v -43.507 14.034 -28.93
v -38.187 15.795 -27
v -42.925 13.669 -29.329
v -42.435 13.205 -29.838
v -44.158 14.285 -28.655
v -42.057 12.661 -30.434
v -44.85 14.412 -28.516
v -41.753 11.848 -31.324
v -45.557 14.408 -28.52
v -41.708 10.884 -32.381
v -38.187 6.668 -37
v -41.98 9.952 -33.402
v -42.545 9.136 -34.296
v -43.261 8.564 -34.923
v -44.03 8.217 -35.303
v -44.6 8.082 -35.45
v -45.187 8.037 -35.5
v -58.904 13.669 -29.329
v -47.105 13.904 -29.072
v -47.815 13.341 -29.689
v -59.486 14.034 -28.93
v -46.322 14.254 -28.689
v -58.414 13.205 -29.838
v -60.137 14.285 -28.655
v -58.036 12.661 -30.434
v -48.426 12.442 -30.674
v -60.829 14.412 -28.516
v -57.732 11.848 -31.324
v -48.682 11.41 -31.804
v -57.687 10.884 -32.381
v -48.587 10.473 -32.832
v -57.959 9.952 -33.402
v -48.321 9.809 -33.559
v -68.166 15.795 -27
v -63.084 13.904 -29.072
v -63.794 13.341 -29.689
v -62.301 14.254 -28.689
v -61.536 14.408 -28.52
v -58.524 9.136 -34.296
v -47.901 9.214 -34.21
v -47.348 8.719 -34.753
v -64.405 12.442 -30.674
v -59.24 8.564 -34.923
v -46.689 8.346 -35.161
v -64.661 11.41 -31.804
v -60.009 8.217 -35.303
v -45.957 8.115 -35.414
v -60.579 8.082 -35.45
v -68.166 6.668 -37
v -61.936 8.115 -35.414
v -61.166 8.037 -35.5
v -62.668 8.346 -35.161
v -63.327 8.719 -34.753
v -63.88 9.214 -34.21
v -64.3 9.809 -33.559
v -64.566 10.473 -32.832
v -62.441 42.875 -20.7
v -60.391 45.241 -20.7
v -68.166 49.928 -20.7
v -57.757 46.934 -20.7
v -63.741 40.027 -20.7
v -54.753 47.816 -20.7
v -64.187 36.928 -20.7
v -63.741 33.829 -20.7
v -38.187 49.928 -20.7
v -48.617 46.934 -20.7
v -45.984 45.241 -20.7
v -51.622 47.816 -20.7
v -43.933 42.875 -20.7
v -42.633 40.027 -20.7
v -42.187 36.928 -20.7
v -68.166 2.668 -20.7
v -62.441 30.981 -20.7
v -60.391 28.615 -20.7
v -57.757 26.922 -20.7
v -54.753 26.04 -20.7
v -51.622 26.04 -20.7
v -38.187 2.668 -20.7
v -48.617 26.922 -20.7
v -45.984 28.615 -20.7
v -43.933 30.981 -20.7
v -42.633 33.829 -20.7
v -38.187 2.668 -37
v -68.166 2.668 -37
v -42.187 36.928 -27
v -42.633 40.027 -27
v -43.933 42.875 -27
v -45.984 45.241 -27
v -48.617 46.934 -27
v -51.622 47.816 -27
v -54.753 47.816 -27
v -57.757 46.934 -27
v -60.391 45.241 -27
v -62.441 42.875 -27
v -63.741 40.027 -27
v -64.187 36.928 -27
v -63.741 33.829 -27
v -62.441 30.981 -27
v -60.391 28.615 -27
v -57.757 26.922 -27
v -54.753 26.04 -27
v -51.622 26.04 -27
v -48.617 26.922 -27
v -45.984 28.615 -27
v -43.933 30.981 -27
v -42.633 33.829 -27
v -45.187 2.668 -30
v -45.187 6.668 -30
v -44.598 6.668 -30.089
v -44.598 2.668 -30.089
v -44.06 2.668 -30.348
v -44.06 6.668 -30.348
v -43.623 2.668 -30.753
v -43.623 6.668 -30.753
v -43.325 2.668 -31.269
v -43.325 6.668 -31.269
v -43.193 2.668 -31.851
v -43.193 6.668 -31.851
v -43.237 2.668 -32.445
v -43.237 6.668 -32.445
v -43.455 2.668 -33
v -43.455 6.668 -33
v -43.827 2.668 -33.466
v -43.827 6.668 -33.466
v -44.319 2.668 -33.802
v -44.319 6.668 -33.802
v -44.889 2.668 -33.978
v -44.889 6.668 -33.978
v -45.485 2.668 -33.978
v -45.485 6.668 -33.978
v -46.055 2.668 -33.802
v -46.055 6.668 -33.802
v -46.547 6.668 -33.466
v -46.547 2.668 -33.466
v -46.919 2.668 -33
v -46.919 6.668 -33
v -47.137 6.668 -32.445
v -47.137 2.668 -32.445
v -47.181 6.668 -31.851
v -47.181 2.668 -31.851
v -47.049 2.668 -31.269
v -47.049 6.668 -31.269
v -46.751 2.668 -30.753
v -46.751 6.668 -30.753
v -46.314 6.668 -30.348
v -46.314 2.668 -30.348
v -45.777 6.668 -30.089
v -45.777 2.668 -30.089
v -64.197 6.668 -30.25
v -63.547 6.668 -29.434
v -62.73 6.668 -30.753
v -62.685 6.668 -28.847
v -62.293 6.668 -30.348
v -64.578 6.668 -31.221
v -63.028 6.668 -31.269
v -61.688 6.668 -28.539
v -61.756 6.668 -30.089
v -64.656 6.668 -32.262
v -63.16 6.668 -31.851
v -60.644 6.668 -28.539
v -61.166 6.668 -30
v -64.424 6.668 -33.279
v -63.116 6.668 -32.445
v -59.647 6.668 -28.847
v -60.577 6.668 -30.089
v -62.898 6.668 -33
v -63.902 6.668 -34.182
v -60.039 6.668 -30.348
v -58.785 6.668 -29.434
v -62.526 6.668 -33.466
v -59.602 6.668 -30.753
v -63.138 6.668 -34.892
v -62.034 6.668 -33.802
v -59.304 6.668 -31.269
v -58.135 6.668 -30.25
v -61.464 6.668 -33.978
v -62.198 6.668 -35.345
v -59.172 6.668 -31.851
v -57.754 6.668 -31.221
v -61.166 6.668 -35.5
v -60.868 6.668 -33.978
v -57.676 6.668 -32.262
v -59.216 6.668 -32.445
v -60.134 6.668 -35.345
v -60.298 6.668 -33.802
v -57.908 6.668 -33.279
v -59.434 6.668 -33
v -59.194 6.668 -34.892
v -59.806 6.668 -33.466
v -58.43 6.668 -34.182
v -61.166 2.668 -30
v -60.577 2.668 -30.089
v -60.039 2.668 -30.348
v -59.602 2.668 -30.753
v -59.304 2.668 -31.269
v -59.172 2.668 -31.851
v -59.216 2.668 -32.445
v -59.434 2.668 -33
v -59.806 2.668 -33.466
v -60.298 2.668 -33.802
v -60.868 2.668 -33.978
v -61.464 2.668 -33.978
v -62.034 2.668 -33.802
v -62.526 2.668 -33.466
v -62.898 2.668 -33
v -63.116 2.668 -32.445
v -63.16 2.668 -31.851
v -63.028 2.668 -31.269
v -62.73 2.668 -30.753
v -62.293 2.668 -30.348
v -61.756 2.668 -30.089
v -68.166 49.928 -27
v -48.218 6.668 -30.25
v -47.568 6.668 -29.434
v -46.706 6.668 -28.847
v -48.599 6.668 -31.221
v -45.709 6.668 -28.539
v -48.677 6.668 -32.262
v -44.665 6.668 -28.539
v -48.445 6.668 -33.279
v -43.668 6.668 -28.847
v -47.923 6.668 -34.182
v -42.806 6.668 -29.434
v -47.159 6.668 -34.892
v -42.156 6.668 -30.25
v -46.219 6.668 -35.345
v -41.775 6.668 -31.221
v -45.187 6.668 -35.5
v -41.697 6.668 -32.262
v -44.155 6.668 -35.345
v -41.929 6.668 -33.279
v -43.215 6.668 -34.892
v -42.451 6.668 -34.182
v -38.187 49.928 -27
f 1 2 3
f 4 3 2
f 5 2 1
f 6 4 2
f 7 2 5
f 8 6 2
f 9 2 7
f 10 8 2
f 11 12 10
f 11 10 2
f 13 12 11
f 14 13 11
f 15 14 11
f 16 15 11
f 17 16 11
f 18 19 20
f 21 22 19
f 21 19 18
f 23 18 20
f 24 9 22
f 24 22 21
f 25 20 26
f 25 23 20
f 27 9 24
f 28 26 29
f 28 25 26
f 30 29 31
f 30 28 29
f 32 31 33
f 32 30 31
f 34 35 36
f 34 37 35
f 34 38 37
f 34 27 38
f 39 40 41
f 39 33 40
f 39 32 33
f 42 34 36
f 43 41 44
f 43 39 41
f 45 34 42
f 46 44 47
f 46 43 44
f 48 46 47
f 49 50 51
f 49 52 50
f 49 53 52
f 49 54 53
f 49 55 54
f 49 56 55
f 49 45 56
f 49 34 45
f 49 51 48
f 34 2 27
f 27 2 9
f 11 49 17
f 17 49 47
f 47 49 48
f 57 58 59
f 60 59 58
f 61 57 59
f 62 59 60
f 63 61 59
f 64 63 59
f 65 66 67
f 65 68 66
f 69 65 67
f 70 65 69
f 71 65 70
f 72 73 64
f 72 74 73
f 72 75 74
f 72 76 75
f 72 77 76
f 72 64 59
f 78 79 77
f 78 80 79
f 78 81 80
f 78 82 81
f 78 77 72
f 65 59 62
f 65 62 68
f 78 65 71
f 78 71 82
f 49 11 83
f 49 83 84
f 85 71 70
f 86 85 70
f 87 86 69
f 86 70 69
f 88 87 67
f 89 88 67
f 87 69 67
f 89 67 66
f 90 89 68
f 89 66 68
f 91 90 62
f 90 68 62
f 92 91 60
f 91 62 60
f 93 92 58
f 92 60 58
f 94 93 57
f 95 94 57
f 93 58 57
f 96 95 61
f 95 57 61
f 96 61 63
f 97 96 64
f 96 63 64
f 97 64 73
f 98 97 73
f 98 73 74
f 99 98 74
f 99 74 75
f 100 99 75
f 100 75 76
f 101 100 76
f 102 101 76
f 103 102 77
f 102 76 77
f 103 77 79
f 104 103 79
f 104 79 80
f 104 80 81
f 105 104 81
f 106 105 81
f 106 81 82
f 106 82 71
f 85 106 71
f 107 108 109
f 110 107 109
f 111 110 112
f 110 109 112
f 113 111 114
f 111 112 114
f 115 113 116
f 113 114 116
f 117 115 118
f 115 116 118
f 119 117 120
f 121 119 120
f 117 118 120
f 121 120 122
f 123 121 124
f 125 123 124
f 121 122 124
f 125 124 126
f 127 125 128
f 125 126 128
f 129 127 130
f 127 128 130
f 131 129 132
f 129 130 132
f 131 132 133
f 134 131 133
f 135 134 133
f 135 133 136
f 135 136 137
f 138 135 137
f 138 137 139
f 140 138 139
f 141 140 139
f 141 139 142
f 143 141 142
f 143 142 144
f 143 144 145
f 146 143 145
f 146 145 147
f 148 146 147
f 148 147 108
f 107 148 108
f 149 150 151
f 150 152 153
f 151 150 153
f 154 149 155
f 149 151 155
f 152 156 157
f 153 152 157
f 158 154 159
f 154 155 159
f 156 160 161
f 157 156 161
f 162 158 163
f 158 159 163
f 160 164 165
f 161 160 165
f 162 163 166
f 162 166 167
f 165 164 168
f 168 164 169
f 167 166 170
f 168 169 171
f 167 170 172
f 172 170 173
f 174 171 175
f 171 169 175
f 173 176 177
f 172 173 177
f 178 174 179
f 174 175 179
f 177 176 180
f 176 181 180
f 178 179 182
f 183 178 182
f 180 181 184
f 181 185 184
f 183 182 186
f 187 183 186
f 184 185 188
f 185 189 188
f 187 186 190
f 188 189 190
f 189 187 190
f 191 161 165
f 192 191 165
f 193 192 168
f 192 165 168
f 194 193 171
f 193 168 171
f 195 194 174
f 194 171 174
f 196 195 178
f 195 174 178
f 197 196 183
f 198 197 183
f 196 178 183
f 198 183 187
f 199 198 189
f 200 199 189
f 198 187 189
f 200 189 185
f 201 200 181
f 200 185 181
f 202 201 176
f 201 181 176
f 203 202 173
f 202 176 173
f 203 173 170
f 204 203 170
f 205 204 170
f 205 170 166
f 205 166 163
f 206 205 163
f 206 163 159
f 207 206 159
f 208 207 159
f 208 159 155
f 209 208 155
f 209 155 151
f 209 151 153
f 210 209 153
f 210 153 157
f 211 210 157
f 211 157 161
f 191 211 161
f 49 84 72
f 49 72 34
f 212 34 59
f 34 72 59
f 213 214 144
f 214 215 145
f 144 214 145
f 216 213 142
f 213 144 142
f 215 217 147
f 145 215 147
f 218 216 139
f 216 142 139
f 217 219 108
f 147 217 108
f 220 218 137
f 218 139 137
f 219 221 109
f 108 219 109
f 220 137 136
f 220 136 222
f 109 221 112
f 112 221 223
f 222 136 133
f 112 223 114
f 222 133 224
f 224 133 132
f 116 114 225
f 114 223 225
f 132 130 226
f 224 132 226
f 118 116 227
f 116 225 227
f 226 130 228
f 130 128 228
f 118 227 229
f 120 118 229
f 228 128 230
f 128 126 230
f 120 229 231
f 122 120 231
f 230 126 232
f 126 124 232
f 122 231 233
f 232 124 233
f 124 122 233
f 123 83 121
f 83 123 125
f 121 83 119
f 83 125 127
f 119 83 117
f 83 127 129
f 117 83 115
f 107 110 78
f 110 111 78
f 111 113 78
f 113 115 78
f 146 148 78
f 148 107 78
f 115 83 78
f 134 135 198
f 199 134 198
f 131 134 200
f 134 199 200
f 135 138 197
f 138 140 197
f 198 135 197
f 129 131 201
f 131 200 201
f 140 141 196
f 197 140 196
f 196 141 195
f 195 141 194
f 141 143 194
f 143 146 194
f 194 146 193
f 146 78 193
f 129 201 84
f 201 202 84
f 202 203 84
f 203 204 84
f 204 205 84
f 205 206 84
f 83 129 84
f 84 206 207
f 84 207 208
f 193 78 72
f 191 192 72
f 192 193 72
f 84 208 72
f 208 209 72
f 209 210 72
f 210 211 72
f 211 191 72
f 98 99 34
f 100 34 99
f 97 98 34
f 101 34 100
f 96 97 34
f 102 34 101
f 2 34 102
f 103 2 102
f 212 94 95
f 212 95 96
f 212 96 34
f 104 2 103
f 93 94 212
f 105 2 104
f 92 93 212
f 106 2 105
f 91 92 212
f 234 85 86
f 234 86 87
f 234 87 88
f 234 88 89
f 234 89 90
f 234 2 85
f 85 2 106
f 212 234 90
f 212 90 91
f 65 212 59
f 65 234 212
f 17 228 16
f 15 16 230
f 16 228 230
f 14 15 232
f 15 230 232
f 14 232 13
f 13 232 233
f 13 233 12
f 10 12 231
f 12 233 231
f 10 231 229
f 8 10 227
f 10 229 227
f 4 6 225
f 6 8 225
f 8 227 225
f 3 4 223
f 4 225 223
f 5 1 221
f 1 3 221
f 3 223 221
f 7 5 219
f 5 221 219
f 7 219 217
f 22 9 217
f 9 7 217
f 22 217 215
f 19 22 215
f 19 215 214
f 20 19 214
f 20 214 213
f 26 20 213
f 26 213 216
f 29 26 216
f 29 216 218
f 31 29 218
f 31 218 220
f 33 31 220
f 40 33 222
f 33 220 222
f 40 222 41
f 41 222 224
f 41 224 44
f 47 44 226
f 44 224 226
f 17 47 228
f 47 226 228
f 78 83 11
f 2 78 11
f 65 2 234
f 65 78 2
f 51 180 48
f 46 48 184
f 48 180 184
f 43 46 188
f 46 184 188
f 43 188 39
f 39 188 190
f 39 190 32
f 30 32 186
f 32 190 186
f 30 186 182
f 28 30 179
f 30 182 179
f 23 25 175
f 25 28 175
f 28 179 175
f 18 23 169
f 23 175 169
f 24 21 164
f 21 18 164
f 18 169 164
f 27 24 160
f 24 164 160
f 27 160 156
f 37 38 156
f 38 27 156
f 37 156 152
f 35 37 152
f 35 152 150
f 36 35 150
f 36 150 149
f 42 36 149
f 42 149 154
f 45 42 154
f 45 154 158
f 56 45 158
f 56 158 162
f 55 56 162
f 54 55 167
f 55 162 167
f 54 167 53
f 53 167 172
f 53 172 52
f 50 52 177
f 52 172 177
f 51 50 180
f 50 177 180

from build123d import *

# Parameters (mm, degrees)
SKETCH1_W            = 93
SKETCH1_H            = 100
BOSS_EXTRUDE2_DEPTH  = 10
SKETCH4_W            = 10.01
SKETCH4_H            = 15
BOSS_EXTRUDE4_DEPTH  = 24
SKETCH5_R            = 2
CUT_EXTRUDE1_DEPTH   = 50
SKETCH7_R            = 11
CUT_EXTRUDE3_DEPTH   = 50
SKETCH14_W           = 61.5
SKETCH14_H           = 42
CUT_EXTRUDE8_DEPTH   = 4
SKETCH19_R           = 11
CUT_EXTRUDE11_DEPTH  = 15
SKETCH20_R           = 2
CUT_EXTRUDE12_DEPTH  = 10
SKETCH21_W           = 40
SKETCH21_H           = 6
BOSS_EXTRUDE5_DEPTH  = 27
SKETCH22_W           = 40
SKETCH22_H           = 6.3
BOSS_EXTRUDE7_DEPTH  = 40
SKETCH23_R           = 8
CUT_EXTRUDE13_DEPTH  = 40
SKETCH24_W           = 118.277817783
SKETCH24_H           = 41.8
CUT_EXTRUDE14_DEPTH  = 40
SKETCH25_W           = 31.5
SKETCH25_H           = 23.2
CUT_EXTRUDE15_DEPTH  = 20
CUT_EXTRUDE18_DEPTH  = 3
SKETCH27_R           = 4.1
SKETCH27_R_2         = 4
CUT_EXTRUDE29_DEPTH  = 3
SKETCH28_W           = 29.5
SKETCH28_H           = 58.2
CUT_EXTRUDE30_DEPTH  = 23
SKETCH29_W           = 32
SKETCH29_H           = 4
CUT_EXTRUDE31_DEPTH  = 23
SKETCH31_W           = 32
SKETCH31_H           = 6
BOSS_EXTRUDE9_DEPTH  = 6.6
SKETCH32_W           = 32
SKETCH32_H           = 6
BOSS_EXTRUDE10_DEPTH = 10
SKETCH33_R           = 2
CUT_EXTRUDE32_DEPTH  = 10
BOSS_EXTRUDE11_START = -32
BOSS_EXTRUDE11_DEPTH = 32
SKETCH35_R           = 3.5
CUT_EXTRUDE33_DEPTH  = 10
SKETCH36_W           = 40
SKETCH36_H           = 6.3
BOSS_EXTRUDE12_DEPTH = 18.8
SKETCH37_W           = 40
SKETCH37_H           = 6
BOSS_EXTRUDE13_DEPTH = 16
SKETCH38_R           = 2
CUT_EXTRUDE34_DEPTH  = 16
BOSS_EXTRUDE14_DEPTH = 40
SKETCH40_R           = 3.5
CUT_EXTRUDE35_DEPTH  = 16
SKETCH41_W           = 16
SKETCH41_H           = 64.8
CUT_EXTRUDE36_DEPTH  = 76
SKETCH42_W           = 20.7
SKETCH42_H           = 6
CUT_EXTRUDE37_DEPTH  = 76
SKETCH43_W           = 10.32098901
SKETCH43_H           = 73.075116481
CUT_EXTRUDE38_DEPTH  = 30
SKETCH44_W           = 2
SKETCH44_H           = 70.783229749
CUT_EXTRUDE39_DEPTH  = 30
SKETCH45_W           = 27.67901099
SKETCH45_H           = 15
CUT_EXTRUDE40_DEPTH  = 30
SKETCH46_W           = 27.67901099
SKETCH46_H           = 2.54
CUT_EXTRUDE41_DEPTH  = 110
SKETCH47_R           = 11
CUT_EXTRUDE42_DEPTH  = 20
BOSS_EXTRUDE16_DEPTH = 2.3
CUT_EXTRUDE43_DEPTH  = 50
SKETCH51_W           = 29.97901099
SKETCH51_H           = 4
BOSS_EXTRUDE17_DEPTH = 10
SKETCH52_R           = 2
CUT_EXTRUDE44_DEPTH  = 10
BOSS_EXTRUDE18_DEPTH = 29.979011
SKETCH54_R           = 3.5
CUT_EXTRUDE45_DEPTH  = 10


with BuildPart() as part:
    # Sketch1 → Boss-Extrude2 (new body)
    with BuildSketch(Plane.XY):
        with Locations((-29.68705036, 14.928057554)):
            Rectangle(SKETCH1_W, SKETCH1_H)
    extrude(amount=BOSS_EXTRUDE2_DEPTH)

    # Sketch4 → Boss-Extrude4 (add)
    with BuildSketch(Plane(origin=(16.81294964, 0, 0), x_dir=(0, 0, -1), z_dir=(1, 0, 0))):
        with Locations((-4.995, -12.571942446)):
            Rectangle(SKETCH4_W, SKETCH4_H)
    extrude(amount=BOSS_EXTRUDE4_DEPTH)

    # Sketch5 → Cut-Extrude1 (cut)
    with BuildSketch(Plane(origin=(0, -5.071942446, 0), x_dir=(1, 0, 0), z_dir=(0, 1, 0))):
        with Locations(Location((26.81294964, -5, 0), (0, 0, 180))):
            Circle(SKETCH5_R)
    extrude(amount=-CUT_EXTRUDE1_DEPTH, mode=Mode.SUBTRACT)

    # Sketch7 → Cut-Extrude3 (cut)
    with BuildSketch(Plane(origin=(0, 0, 0), x_dir=(-1, 0, 0), z_dir=(0, 0, -1))):
        with Locations((24.18705036, 36.928057554)):
            Circle(SKETCH7_R)
    extrude(amount=-CUT_EXTRUDE3_DEPTH, mode=Mode.SUBTRACT)

    # Sketch14 → Cut-Extrude8 (cut)
    with BuildSketch(Plane.XY.offset(10)):
        with Locations((-13.93705036, 36.789132279)):
            Rectangle(SKETCH14_W, SKETCH14_H)
    extrude(amount=-CUT_EXTRUDE8_DEPTH, mode=Mode.SUBTRACT)

    # Sketch19 → Cut-Extrude11 (cut)
    with BuildSketch(Plane(origin=(0, 0, 0), x_dir=(-1, 0, 0), z_dir=(0, 0, -1))):
        with Locations((53.18705036, 36.928057554)):
            Circle(SKETCH19_R)
    extrude(amount=-CUT_EXTRUDE11_DEPTH, mode=Mode.SUBTRACT)

    # Sketch20 → Cut-Extrude12 (cut)
    with BuildSketch(Plane.XY.offset(6)):
        with Locations((-34.68705036, 50.928057554)):
            Circle(SKETCH20_R)
        with Locations((5.31294964, 50.928057554)):
            Circle(SKETCH20_R)
        with Locations((-34.68705036, 22.928057554)):
            Circle(SKETCH20_R)
        with Locations((5.31294964, 22.928057554)):
            Circle(SKETCH20_R)
    extrude(amount=-CUT_EXTRUDE12_DEPTH, mode=Mode.SUBTRACT)

    # Sketch21 → Boss-Extrude5 (add)
    with BuildSketch(Plane(origin=(0, 0, 0), x_dir=(-1, 0, 0), z_dir=(0, 0, -1))):
        with Locations((56.18705036, 61.928057554)):
            Rectangle(SKETCH21_W, SKETCH21_H)
    extrude(amount=BOSS_EXTRUDE5_DEPTH)

    # Sketch22 → Boss-Extrude7 (add)
    with BuildSketch(Plane.XZ.offset(-58.928057554)):
        with Locations((-56.18705036, -23.85)):
            Rectangle(SKETCH22_W, SKETCH22_H)
    extrude(amount=BOSS_EXTRUDE7_DEPTH)

    # Sketch23 → Cut-Extrude13 (cut)
    with BuildSketch(Plane.XY.offset(10)):
        with Locations((-53.18705036, 36.928057554)):
            Circle(SKETCH23_R)
    extrude(amount=-CUT_EXTRUDE13_DEPTH, mode=Mode.SUBTRACT)

    # Sketch24 → Cut-Extrude14 (cut)
    with BuildSketch(Plane.XY.offset(10)):
        with Locations((-17.048141468, -14.171942446)):
            Rectangle(SKETCH24_W, SKETCH24_H)
    extrude(amount=-CUT_EXTRUDE14_DEPTH, mode=Mode.SUBTRACT)

    # Sketch25 → Cut-Extrude15 (cut)
    with BuildSketch(Plane.XY.offset(10)):
        with Locations((-60.43705036, 18.328057554)):
            Rectangle(SKETCH25_W, SKETCH25_H)
    extrude(amount=-CUT_EXTRUDE15_DEPTH, mode=Mode.SUBTRACT)

    # Sketch26 → Cut-Extrude18 (cut)
    with BuildSketch(Plane.XY.offset(6)):
        with BuildLine():
            Line((14.30212304, 57.789132279), (6.863398886, 57.789132279))
            Line((6.863398886, 57.789132279), (6.863398886, 54.615347499))
            ThreePointArc((6.863398886, 54.615347499), (8.24773413, 53.645968516), (9.108195728, 52.191428892))
            Line((9.108195728, 52.191428892), (14.30212304, 52.191428892))
            Line((14.30212304, 52.191428892), (14.30212304, 57.789132279))
        make_face()
        with BuildLine():
            Line((6.863398886, 19.240767609), (6.863398886, 15.789132279))
            Line((6.863398886, 15.789132279), (14.30212304, 15.789132279))
            Line((14.30212304, 15.789132279), (14.30212304, 20.928057554))
            Line((14.30212304, 20.928057554), (8.777051255, 20.928057554))
            ThreePointArc((8.777051255, 20.928057554), (7.95835451, 19.927752057), (6.863398886, 19.240767609))
        make_face()
        with BuildLine():
            Line((-36.237499605, 57.789132279), (-44.68705036, 57.789132279))
            Line((-44.68705036, 57.789132279), (-44.68705036, 52.191428892))
            Line((-44.68705036, 52.191428892), (-38.482296447, 52.191428892))
            ThreePointArc((-38.482296447, 52.191428892), (-37.621834849, 53.645968516), (-36.237499605, 54.615347499))
            Line((-36.237499605, 54.615347499), (-36.237499605, 57.789132279))
        make_face()
        with BuildLine():
            Line((-44.68705036, 21.664686216), (-44.68705036, 15.789132279))
            Line((-44.68705036, 15.789132279), (-36.237499605, 15.789132279))
            Line((-36.237499605, 15.789132279), (-36.237499605, 19.240767609))
            ThreePointArc((-36.237499605, 19.240767609), (-37.621834849, 20.210146592), (-38.482296447, 21.664686216))
            Line((-38.482296447, 21.664686216), (-44.68705036, 21.664686216))
        make_face()
    extrude(amount=-CUT_EXTRUDE18_DEPTH, mode=Mode.SUBTRACT)

    # Sketch27 → Cut-Extrude29 (cut)
    with BuildSketch(Plane.XY.offset(6)):
        with Locations((5.31294964, 50.928057554)):
            Circle(SKETCH27_R)
        with Locations((5.31294964, 22.928057554)):
            Circle(SKETCH27_R_2)
        with Locations((-34.68705036, 50.928057554)):
            Circle(SKETCH27_R)
        with Locations((-34.68705036, 22.928057554)):
            Circle(SKETCH27_R)
    extrude(amount=-CUT_EXTRUDE29_DEPTH, mode=Mode.SUBTRACT)

    # Sketch28 → Cut-Extrude30 (cut)
    with BuildSketch(Plane(origin=(0, 0, 0), x_dir=(-1, 0, 0), z_dir=(0, 0, -1))):
        with Locations((-2.06294964, 35.828057554)):
            Rectangle(SKETCH28_W, SKETCH28_H)
    extrude(amount=-CUT_EXTRUDE30_DEPTH, mode=Mode.SUBTRACT)

    # Sketch29 → Cut-Extrude31 (cut)
    with BuildSketch(Plane(origin=(0, 15.789132279, 0), x_dir=(1, 0, 0), z_dir=(0, 1, 0))):
        with Locations((-28.68705036, -8)):
            Rectangle(SKETCH29_W, SKETCH29_H)
    extrude(amount=-CUT_EXTRUDE31_DEPTH, mode=Mode.SUBTRACT)

    # Sketch31 → Boss-Extrude9 (add)
    with BuildSketch(Plane.XZ.offset(-6.728057554)):
        with Locations((-28.68705036, 3)):
            Rectangle(SKETCH31_W, SKETCH31_H)
    extrude(amount=BOSS_EXTRUDE9_DEPTH)

    # Sketch32 → Boss-Extrude10 (add)
    with BuildSketch(Plane.XY.offset(6)):
        with Locations((-28.68705036, 3.128057554)):
            Rectangle(SKETCH32_W, SKETCH32_H)
    extrude(amount=BOSS_EXTRUDE10_DEPTH)

    # Sketch33 → Cut-Extrude32 (cut)
    with BuildSketch(Plane(origin=(0, 6.128057554, 0), x_dir=(1, 0, 0), z_dir=(0, 1, 0))):
        with Locations(Location((-37.68705036, -11, 0), (0, 0, 270))):
            Circle(SKETCH33_R)
        with Locations(Location((-19.68705036, -11, 0), (0, 0, 270))):
            Circle(SKETCH33_R)
    extrude(amount=-CUT_EXTRUDE32_DEPTH, mode=Mode.SUBTRACT)

    # Sketch34 → Boss-Extrude11 (add)
    with BuildSketch(Plane(origin=(-12.68705036, 0, 0), x_dir=(0, 0, -1), z_dir=(1, 0, 0)).offset(BOSS_EXTRUDE11_START)):
        Polygon((-16, 6.128057554), (-6, 6.128057554), (-6, 14.058360342), align=None)
    extrude(amount=BOSS_EXTRUDE11_DEPTH)

    # Sketch35 → Cut-Extrude33 (cut)
    with BuildSketch(Plane.XZ.offset(-6.128057554)):
        with Locations((-19.68705036, 11)):
            Circle(SKETCH35_R)
        with Locations((-37.68705036, 11)):
            Circle(SKETCH35_R)
    extrude(amount=-CUT_EXTRUDE33_DEPTH, mode=Mode.SUBTRACT)

    # Sketch36 → Boss-Extrude12 (add)
    with BuildSketch(Plane.XZ.offset(-18.928057554)):
        with Locations((-56.18705036, -23.85)):
            Rectangle(SKETCH36_W, SKETCH36_H)
    extrude(amount=BOSS_EXTRUDE12_DEPTH)

    # Sketch37 → Boss-Extrude13 (add)
    with BuildSketch(Plane.XY.offset(-20.7)):
        with Locations((-56.18705036, 3.128057554)):
            Rectangle(SKETCH37_W, SKETCH37_H)
    extrude(amount=BOSS_EXTRUDE13_DEPTH)

    # Sketch38 → Cut-Extrude34 (cut)
    with BuildSketch(Plane(origin=(0, 6.128057554, 0), x_dir=(1, 0, 0), z_dir=(0, 1, 0))):
        with Locations(Location((-58.18705036, 10.7, 0), (0, 0, 180))):
            Circle(SKETCH38_R)
        with Locations(Location((-45.18705036, 10.7, 0), (0, 0, 180))):
            Circle(SKETCH38_R)
    extrude(amount=-CUT_EXTRUDE34_DEPTH, mode=Mode.SUBTRACT)

    # Sketch39 → Boss-Extrude14 (add)
    with BuildSketch(Plane(origin=(-36.18705036, 0, 0), x_dir=(0, 0, -1), z_dir=(1, 0, 0))):
        Polygon((4.7, 6.128057554), (20.7, 18.878141719), (20.7, 6.128057554), align=None)
    extrude(amount=-BOSS_EXTRUDE14_DEPTH)

    # Sketch40 → Cut-Extrude35 (cut)
    with BuildSketch(Plane.XZ.offset(-6.128057554)):
        with Locations(Location((-45.18705036, -10.7, 0), (0, 0, 270))):
            Circle(SKETCH40_R)
        with Locations(Location((-58.18705036, -10.7, 0), (0, 0, 270))):
            Circle(SKETCH40_R)
    extrude(amount=-CUT_EXTRUDE35_DEPTH, mode=Mode.SUBTRACT)

    # Sketch41 → Cut-Extrude36 (cut)
    with BuildSketch(Plane(origin=(-12.68705036, 0, 0), x_dir=(0, 0, -1), z_dir=(1, 0, 0))):
        with Locations((-8, 32.528057554)):
            Rectangle(SKETCH41_W, SKETCH41_H)
    extrude(amount=-CUT_EXTRUDE36_DEPTH, mode=Mode.SUBTRACT)

    # Sketch42 → Cut-Extrude37 (cut)
    with BuildSketch(Plane(origin=(-36.18705036, 0, 0), x_dir=(0, 0, -1), z_dir=(1, 0, 0))):
        with Locations((10.35, 61.928057554)):
            Rectangle(SKETCH42_W, SKETCH42_H)
    extrude(amount=-CUT_EXTRUDE37_DEPTH, mode=Mode.SUBTRACT)

    # Sketch43 → Cut-Extrude38 (cut)
    with BuildSketch(Plane.XY.offset(-4.7)):
        with Locations((-71.026555855, 36.665615794)):
            Rectangle(SKETCH43_W, SKETCH43_H)
    extrude(amount=-CUT_EXTRUDE38_DEPTH, mode=Mode.SUBTRACT)

    # Sketch44 → Cut-Extrude39 (cut)
    with BuildSketch(Plane.XY.offset(-4.7)):
        with Locations((-37.18705036, 35.519672429)):
            Rectangle(SKETCH44_W, SKETCH44_H)
    extrude(amount=-CUT_EXTRUDE39_DEPTH, mode=Mode.SUBTRACT)

    # Sketch45 → Cut-Extrude40 (cut)
    with BuildSketch(Plane.XY.offset(-20.7)):
        with Locations((-52.026555855, 57.428057554)):
            Rectangle(SKETCH45_W, SKETCH45_H)
    extrude(amount=-CUT_EXTRUDE40_DEPTH, mode=Mode.SUBTRACT)

    # Sketch46 → Cut-Extrude41 (cut)
    with BuildSketch(Plane.XY.offset(-4.7)):
        with Locations((-52.026555855, 1.398057554)):
            Rectangle(SKETCH46_W, SKETCH46_H)
    extrude(amount=-CUT_EXTRUDE41_DEPTH, mode=Mode.SUBTRACT)

    # Sketch47 → Cut-Extrude42 (cut)
    with BuildSketch(Plane.XY.offset(-20.7)):
        with Locations((-53.18705036, 36.928057554)):
            Circle(SKETCH47_R)
    extrude(amount=-CUT_EXTRUDE42_DEPTH, mode=Mode.SUBTRACT)

    # Sketch48 → Boss-Extrude16 (add)
    with BuildSketch(Plane.ZY.offset(65.86606135)):
        Polygon((-27, 49.928057554), (-20.7, 49.928057554), (-20.7, 18.878141719), (-4.7, 6.128057554), (-4.7, 2.668057554), (-27, 2.668057554), align=None)
    extrude(amount=BOSS_EXTRUDE16_DEPTH)

    # Sketch49 → Cut-Extrude43 (cut)
    with BuildSketch(Plane.ZY.offset(68.16606135)):
        Polygon((-4.7, 2.668057554), (-4.7, 6.128057554), (-20.7, 18.878141719), (-20.7, 2.668057554), align=None)
    extrude(amount=-CUT_EXTRUDE43_DEPTH, mode=Mode.SUBTRACT)

    # Sketch51 → Boss-Extrude17 (add)
    with BuildSketch(Plane(origin=(0, 0, -27), x_dir=(-1, 0, 0), z_dir=(0, 0, -1))):
        with Locations((53.176555855, 4.668057554)):
            Rectangle(SKETCH51_W, SKETCH51_H)
    extrude(amount=BOSS_EXTRUDE17_DEPTH)

    # Sketch52 → Cut-Extrude44 (cut)
    with BuildSketch(Plane(origin=(0, 6.668057554, 0), x_dir=(1, 0, 0), z_dir=(0, 1, 0))):
        with Locations(Location((-45.18705036, 32, 0), (0, 0, 270))):
            Circle(SKETCH52_R)
        with Locations(Location((-61.16606135, 32, 0), (0, 0, 270))):
            Circle(SKETCH52_R)
    extrude(amount=-CUT_EXTRUDE44_DEPTH, mode=Mode.SUBTRACT)

    # Sketch53 → Boss-Extrude18 (add)
    with BuildSketch(Plane.ZY.offset(68.16606135)):
        Polygon((-37, 6.668057554), (-27, 6.668057554), (-27, 15.795425769), align=None)
    extrude(amount=-BOSS_EXTRUDE18_DEPTH)

    # Sketch54 → Cut-Extrude45 (cut)
    with BuildSketch(Plane.XZ.offset(-6.668057554)):
        with Locations(Location((-61.16606135, -32, 0), (0, 0, 270))):
            Circle(SKETCH54_R)
        with Locations(Location((-45.18705036, -32, 0), (0, 0, 270))):
            Circle(SKETCH54_R)
    extrude(amount=-CUT_EXTRUDE45_DEPTH, mode=Mode.SUBTRACT)


solid = part.part
